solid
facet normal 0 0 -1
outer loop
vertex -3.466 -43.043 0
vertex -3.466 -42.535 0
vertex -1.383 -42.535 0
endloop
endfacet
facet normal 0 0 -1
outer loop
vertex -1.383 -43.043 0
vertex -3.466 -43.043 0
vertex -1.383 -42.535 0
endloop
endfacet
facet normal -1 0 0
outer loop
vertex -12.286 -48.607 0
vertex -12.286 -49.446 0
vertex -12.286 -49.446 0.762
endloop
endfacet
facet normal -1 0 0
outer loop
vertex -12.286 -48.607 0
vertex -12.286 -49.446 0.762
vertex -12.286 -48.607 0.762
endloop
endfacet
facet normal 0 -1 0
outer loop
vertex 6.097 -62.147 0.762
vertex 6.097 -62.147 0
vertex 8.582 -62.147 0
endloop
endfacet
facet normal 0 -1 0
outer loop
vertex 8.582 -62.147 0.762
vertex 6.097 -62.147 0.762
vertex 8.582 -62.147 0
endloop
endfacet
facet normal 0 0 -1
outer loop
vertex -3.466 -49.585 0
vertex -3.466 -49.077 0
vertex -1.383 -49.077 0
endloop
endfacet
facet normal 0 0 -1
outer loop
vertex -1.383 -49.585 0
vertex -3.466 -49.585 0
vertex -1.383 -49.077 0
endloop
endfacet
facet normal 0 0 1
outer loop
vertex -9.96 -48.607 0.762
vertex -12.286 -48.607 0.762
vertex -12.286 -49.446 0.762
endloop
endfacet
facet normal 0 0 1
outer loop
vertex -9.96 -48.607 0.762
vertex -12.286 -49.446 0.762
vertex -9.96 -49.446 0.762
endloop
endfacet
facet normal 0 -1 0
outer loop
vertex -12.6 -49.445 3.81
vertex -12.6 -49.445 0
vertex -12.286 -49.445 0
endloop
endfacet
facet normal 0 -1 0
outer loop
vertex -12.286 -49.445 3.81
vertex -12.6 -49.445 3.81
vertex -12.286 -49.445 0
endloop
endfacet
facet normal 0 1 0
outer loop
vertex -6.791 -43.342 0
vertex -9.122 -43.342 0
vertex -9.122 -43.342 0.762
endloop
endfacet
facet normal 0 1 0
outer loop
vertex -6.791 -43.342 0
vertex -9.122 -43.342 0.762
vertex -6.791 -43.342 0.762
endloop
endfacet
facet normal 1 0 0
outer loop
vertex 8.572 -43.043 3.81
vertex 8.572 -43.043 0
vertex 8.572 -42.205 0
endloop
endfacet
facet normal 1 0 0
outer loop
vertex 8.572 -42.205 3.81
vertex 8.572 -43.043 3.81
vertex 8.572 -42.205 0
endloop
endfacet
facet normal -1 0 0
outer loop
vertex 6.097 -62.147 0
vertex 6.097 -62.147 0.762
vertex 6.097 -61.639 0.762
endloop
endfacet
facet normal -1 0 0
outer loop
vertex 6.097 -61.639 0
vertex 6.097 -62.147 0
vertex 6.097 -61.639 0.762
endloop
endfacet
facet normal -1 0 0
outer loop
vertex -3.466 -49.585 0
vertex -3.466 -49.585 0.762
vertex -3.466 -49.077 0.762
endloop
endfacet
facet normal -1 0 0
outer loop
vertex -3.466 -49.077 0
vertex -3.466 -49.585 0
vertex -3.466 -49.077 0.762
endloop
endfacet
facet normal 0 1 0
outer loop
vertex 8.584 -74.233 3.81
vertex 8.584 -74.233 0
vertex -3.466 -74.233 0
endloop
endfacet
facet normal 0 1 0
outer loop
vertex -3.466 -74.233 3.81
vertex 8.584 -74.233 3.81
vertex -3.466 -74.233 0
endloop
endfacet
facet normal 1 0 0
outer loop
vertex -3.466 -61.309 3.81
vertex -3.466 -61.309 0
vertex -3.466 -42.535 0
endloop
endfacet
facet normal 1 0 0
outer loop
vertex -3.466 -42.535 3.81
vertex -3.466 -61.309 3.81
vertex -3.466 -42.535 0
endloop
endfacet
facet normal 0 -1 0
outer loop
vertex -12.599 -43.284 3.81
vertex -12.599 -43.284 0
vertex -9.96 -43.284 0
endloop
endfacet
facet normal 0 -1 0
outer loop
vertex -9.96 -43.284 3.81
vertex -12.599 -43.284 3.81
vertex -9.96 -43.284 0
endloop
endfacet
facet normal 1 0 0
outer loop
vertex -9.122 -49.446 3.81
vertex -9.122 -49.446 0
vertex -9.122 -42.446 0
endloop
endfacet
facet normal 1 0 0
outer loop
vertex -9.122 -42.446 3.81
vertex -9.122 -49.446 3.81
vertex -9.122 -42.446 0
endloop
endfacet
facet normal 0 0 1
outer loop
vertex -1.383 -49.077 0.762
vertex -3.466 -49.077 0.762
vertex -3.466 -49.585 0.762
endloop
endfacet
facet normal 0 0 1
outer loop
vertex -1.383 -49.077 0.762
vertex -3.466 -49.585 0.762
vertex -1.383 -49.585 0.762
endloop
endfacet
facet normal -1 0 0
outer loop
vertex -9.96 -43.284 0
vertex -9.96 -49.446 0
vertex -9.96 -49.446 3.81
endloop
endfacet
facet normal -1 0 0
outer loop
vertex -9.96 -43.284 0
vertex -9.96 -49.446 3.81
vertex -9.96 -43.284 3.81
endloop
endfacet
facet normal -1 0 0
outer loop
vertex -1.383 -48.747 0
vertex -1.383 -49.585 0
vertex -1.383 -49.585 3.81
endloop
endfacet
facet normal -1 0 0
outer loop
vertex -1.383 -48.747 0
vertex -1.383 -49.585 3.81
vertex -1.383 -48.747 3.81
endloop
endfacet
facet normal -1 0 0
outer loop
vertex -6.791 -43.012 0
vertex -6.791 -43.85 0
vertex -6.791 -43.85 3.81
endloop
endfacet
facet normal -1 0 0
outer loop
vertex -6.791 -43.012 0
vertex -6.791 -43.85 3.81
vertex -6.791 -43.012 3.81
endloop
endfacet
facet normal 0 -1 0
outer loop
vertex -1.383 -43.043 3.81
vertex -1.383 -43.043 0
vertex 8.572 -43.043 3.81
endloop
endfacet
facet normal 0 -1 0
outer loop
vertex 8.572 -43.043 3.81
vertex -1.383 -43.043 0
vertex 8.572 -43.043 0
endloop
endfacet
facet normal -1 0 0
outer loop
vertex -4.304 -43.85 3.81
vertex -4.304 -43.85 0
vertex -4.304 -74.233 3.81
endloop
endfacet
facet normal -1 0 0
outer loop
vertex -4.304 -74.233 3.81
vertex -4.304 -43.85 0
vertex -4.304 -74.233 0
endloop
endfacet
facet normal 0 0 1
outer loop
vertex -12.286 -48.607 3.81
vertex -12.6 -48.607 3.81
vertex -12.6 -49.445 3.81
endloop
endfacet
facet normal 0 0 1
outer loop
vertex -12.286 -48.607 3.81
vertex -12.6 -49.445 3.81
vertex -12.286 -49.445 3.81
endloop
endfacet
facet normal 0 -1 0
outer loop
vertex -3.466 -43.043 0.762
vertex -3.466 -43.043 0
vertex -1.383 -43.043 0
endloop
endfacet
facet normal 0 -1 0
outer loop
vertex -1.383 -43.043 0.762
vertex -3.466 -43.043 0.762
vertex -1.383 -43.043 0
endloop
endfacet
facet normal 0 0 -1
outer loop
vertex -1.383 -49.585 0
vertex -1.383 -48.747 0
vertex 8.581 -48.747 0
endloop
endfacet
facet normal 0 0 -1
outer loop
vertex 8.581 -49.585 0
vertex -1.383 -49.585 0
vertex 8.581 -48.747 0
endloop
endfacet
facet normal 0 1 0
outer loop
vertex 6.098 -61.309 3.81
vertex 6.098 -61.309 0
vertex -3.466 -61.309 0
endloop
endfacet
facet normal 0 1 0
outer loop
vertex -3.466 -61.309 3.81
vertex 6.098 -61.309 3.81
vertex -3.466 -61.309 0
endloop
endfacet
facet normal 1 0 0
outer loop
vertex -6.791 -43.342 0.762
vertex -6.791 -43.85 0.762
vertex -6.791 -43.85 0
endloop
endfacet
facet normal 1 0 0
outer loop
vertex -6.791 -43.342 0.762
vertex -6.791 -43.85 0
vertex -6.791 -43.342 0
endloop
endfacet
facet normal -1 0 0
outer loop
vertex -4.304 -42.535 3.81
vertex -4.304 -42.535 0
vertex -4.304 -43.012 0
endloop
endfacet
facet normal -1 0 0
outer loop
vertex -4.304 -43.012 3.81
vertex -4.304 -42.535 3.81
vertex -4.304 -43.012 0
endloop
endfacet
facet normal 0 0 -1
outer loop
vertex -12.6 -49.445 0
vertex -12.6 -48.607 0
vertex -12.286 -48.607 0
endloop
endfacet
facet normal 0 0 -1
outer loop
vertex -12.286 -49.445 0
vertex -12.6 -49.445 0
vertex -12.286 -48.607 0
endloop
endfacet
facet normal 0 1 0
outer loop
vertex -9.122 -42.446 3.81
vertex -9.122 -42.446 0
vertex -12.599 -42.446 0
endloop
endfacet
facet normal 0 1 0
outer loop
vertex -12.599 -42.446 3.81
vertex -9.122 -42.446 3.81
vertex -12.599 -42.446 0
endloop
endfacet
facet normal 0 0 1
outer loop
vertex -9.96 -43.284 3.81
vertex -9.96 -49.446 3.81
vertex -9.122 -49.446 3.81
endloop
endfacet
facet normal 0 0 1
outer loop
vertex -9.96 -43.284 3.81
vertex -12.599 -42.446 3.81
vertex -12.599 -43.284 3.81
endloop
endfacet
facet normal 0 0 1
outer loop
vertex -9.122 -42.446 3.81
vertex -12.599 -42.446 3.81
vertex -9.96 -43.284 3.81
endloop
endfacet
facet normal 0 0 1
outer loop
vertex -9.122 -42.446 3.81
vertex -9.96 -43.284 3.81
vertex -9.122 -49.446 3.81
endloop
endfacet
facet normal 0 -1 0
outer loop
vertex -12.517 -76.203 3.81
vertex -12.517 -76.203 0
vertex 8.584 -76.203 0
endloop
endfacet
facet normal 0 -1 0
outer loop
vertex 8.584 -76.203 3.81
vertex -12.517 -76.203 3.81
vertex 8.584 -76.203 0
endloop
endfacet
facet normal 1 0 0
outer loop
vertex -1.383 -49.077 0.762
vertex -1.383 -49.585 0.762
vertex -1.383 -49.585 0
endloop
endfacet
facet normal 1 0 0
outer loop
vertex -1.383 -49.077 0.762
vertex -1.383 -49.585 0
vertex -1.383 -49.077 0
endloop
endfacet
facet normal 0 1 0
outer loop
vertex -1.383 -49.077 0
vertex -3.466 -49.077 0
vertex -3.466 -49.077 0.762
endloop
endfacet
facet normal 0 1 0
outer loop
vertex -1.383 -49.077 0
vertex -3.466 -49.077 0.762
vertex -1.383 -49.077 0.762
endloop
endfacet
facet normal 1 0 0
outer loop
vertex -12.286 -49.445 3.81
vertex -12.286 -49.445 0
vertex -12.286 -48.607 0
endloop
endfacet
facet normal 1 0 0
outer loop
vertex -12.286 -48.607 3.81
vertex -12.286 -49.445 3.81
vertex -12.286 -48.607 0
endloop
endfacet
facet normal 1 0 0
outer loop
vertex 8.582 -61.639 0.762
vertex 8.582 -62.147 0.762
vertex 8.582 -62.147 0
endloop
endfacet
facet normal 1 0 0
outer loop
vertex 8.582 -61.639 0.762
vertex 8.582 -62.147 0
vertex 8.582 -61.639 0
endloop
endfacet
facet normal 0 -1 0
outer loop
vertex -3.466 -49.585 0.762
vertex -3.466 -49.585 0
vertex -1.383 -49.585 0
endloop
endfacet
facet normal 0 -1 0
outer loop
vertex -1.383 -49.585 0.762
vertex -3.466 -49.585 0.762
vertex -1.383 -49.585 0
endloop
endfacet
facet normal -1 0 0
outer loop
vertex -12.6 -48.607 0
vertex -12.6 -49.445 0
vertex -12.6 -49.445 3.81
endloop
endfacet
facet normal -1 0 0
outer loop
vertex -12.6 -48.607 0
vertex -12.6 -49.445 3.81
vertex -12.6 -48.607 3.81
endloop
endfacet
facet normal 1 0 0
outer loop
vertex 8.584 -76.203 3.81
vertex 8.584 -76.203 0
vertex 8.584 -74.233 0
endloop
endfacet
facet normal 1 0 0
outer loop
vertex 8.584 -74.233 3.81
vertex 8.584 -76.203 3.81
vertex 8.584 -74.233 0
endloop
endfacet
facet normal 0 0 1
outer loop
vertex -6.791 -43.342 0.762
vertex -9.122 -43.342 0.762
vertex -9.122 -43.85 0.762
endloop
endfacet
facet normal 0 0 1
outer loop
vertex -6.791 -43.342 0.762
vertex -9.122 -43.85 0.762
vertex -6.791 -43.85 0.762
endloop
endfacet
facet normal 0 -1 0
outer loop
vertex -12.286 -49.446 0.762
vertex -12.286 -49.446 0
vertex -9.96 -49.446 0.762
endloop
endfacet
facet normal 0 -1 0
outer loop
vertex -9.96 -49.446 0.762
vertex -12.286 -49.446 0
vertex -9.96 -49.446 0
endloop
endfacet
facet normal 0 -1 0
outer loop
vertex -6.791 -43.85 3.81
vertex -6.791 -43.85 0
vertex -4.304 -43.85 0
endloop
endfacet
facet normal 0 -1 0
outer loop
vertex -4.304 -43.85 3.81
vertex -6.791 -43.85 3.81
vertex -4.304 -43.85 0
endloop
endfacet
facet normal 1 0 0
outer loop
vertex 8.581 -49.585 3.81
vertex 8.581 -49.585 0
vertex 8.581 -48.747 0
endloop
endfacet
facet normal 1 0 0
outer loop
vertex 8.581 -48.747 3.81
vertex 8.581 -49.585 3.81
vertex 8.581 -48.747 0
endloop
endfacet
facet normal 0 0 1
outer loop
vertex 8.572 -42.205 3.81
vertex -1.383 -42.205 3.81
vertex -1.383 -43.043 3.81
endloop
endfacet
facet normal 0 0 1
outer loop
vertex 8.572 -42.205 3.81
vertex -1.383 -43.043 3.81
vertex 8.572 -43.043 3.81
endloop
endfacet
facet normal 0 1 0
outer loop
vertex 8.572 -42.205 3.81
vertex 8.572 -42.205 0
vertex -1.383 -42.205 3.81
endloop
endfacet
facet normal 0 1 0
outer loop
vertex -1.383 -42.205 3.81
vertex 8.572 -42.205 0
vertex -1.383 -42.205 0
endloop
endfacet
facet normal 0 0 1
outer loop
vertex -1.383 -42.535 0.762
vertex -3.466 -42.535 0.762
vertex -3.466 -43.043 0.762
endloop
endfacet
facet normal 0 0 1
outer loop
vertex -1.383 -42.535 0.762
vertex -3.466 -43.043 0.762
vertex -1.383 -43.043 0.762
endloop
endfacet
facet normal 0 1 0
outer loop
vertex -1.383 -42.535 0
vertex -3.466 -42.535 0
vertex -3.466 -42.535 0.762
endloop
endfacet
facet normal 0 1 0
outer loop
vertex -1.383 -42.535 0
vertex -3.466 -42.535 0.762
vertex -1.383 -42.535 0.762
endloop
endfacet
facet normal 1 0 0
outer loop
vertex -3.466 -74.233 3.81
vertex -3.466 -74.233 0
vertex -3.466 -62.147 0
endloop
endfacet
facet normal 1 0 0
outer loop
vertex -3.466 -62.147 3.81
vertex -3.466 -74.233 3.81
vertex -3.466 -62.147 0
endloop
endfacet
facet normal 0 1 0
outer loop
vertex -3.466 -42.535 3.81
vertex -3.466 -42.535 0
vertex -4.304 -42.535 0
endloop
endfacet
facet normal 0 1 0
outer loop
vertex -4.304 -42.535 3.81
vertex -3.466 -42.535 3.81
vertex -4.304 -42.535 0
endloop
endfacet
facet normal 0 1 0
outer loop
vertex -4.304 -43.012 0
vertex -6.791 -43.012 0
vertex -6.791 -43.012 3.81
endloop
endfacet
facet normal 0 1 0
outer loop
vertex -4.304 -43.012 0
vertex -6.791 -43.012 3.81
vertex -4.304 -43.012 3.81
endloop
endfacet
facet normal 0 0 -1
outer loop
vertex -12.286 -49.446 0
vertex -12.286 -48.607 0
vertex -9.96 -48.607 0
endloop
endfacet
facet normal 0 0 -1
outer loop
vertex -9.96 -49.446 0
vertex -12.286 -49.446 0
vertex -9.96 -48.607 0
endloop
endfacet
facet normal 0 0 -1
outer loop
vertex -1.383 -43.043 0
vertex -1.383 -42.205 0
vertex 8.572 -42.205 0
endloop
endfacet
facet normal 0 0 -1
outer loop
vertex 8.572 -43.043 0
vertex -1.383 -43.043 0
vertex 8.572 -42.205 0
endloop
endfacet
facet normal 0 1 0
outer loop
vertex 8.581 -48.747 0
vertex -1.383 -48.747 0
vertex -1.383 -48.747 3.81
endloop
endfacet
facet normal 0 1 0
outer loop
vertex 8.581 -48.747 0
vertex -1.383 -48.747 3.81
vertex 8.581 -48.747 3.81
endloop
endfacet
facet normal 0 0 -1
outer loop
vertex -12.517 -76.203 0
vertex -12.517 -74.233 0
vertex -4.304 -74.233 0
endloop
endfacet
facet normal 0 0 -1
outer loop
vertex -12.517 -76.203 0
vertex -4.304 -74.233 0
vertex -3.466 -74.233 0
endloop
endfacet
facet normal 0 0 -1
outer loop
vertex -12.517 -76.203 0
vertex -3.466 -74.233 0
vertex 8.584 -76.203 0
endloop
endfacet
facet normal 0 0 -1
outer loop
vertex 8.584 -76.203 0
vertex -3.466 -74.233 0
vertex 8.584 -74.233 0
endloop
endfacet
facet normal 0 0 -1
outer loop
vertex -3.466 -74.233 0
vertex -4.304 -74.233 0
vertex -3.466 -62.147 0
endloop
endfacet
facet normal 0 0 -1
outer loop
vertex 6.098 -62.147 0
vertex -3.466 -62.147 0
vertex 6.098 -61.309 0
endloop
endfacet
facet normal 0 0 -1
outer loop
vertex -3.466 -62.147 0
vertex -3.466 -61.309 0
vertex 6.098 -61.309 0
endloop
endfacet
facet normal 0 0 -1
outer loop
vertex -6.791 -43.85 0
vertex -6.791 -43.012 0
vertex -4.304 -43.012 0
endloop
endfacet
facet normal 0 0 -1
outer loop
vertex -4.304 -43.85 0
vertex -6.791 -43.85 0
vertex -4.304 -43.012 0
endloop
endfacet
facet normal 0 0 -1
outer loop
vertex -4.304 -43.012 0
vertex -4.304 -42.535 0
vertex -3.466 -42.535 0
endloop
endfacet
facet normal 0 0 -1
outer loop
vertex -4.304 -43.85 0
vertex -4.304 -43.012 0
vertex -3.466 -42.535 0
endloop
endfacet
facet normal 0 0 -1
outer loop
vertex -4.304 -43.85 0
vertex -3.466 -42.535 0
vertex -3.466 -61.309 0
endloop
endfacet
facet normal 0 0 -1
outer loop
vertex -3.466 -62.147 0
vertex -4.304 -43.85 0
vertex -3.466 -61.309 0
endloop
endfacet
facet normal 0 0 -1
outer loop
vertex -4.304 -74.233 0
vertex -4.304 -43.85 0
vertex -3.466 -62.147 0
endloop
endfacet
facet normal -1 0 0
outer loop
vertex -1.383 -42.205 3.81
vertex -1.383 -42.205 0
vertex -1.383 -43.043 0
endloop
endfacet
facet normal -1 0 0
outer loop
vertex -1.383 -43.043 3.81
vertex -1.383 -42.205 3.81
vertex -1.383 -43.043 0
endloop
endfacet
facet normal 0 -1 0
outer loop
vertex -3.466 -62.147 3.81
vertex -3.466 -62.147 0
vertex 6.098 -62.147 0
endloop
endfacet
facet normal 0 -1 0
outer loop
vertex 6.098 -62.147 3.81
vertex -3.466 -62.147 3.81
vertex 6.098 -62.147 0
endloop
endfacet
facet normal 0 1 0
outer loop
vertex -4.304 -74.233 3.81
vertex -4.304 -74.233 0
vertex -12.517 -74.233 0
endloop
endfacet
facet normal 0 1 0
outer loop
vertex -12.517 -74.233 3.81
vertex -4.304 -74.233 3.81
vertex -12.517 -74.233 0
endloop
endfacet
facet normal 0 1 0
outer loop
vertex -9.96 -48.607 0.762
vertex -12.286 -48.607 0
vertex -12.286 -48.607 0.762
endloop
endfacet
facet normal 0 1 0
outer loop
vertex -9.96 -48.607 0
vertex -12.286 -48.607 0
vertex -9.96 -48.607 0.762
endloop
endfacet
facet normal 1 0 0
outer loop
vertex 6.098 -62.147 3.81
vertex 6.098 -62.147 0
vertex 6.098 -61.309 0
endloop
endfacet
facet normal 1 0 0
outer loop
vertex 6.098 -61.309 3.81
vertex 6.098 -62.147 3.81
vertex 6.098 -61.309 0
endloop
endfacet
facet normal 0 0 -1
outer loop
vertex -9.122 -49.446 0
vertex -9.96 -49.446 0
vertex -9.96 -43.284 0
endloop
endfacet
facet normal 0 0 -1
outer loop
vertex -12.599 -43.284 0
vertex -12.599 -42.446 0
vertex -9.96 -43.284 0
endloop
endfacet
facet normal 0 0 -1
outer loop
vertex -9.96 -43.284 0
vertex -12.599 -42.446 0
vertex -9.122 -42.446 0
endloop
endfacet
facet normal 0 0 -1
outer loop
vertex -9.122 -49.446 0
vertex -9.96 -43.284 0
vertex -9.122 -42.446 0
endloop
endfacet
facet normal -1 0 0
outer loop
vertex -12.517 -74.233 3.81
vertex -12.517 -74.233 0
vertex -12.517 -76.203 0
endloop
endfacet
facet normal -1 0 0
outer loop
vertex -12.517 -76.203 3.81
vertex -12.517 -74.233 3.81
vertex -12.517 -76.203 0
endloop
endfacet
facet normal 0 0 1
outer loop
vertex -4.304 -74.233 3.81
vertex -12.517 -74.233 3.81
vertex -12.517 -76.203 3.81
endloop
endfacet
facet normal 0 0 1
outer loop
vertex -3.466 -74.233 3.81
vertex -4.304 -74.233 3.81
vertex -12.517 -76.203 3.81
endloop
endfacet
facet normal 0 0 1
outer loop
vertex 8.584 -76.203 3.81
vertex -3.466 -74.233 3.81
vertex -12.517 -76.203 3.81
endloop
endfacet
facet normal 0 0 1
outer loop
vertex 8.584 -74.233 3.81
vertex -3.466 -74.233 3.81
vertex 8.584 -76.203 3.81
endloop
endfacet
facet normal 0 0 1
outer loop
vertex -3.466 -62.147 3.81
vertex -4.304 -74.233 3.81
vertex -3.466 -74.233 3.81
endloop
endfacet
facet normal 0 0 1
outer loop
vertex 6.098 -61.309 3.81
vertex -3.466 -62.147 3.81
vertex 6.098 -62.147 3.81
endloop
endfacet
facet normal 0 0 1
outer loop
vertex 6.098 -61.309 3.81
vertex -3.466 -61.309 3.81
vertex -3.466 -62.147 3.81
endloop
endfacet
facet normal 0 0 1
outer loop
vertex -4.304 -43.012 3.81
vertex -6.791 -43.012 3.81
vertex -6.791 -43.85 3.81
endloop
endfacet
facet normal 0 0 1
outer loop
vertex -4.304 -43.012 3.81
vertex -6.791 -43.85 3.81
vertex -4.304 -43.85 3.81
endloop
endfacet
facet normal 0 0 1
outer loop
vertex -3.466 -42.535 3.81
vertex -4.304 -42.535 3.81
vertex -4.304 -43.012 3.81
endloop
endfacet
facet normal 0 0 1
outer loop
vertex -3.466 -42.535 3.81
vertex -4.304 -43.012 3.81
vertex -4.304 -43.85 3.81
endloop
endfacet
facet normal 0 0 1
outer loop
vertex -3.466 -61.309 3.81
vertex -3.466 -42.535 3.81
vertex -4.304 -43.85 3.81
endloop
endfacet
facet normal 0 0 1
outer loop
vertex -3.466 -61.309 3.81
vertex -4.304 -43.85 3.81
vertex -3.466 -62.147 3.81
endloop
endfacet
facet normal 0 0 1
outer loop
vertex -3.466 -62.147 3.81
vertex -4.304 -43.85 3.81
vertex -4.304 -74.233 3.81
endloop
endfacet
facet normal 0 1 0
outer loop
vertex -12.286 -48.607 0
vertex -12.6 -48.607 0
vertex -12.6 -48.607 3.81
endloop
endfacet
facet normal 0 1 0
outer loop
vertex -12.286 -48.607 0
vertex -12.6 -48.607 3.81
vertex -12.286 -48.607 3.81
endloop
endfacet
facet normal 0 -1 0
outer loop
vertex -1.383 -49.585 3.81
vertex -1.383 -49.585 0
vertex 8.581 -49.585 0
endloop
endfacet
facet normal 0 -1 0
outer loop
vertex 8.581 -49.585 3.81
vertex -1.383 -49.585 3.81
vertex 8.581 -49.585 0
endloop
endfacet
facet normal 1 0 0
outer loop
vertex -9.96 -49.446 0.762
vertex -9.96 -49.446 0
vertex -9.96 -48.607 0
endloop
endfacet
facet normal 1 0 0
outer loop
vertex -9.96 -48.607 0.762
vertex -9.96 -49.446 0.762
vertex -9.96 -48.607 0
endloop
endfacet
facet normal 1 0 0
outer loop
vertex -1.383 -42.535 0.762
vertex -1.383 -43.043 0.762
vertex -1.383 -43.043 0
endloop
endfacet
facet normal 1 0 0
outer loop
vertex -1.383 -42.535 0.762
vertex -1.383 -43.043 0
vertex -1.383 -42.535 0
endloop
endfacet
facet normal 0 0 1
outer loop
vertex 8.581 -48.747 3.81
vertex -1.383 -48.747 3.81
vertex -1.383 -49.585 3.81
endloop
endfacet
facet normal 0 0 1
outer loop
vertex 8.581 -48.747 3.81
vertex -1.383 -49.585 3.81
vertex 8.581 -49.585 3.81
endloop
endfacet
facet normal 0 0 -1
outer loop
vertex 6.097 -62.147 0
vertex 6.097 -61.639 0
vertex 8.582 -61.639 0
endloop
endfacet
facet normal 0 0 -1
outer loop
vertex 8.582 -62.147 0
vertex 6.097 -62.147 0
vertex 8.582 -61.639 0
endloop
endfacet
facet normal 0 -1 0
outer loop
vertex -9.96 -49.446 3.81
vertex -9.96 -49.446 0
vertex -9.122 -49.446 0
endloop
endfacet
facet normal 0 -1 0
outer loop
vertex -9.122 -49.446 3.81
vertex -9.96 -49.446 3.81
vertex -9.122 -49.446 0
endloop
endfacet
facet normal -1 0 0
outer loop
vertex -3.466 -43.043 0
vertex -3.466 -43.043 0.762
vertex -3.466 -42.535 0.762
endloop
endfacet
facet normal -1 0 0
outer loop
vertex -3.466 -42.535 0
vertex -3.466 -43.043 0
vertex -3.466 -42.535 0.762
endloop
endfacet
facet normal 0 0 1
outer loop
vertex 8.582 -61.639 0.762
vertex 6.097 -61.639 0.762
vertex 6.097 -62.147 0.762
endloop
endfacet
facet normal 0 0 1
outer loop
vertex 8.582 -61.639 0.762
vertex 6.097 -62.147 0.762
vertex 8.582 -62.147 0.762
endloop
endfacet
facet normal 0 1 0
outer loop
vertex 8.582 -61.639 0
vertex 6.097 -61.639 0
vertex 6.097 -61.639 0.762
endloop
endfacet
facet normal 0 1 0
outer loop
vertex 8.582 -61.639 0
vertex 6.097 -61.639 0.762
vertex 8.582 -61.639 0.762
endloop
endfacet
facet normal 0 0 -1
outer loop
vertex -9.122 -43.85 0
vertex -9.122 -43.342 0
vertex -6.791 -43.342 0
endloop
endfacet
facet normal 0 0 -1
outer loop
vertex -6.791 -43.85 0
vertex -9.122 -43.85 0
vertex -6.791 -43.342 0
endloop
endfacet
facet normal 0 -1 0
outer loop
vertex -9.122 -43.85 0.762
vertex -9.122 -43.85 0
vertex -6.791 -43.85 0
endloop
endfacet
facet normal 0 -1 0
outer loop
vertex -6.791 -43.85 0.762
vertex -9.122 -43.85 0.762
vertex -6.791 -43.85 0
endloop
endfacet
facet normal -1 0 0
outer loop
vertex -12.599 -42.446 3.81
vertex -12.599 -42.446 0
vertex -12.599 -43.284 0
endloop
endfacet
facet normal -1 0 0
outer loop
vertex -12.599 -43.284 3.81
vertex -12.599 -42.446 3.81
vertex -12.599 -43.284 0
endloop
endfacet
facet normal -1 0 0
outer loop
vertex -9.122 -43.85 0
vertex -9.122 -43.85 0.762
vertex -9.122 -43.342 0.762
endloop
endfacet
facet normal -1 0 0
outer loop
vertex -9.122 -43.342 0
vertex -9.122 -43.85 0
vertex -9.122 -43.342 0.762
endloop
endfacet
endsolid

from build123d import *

# Parameters (mm, degrees)
F0_W     = 9.5635297272
F0_H     = 0.8382
F0_W_2   = 0.013438423
F0_W_3   = 0.8382
F0_H_2   = 1.9130930305
F0_W_4   = 2.4869742338
F1_DEPTH = 3.81
F0_W_5   = 9.9639619002
F0_W_6   = 0.3146585077
F0_H_3   = 6.1624832451
F2_W     = 2.3257764
F2_H     = 0.8382
F3_DEPTH = 0.762
F2_W_2   = 2.3305516
F2_H_2   = 0.508
F2_W_3   = 2.0828
F2_W_4   = 2.4851868


with BuildPart() as f1:
    # F0 (on Top) → F1 (new body)
    with BuildSketch(Plane.XY):
        with Locations((1.315930461, -61.7276642486)):
            Rectangle(F0_W, F0_H)
        with Locations((-3.4725536141, -61.7276642486)):
            Rectangle(F0_W_2, F0_H)
        Polygon((-3.4792728256, -61.3085642486), (-3.4658344026, -61.3085642486), (-3.4658344026, -42.5347350538), (-4.3040344026, -42.5347350538), (-4.3040344026, -43.0116258591), (-4.3040344026, -43.8498258591), (-4.3040344026, -74.232660234), (-3.4658344026, -74.232660234), (-3.4658344026, -62.1467642486), (-3.4792728256, -62.1467642486), align=None)
        Polygon((8.5839493171, -74.232660234), (-3.4658344026, -74.232660234), (-3.4658344026, -76.1457532644), (-4.3040344026, -76.1457532644), (-4.3040344026, -74.232660234), (-12.5174090295, -74.232660234), (-12.5174090295, -76.2031450868), (8.5839493171, -76.2031450868), align=None)
        with Locations((-3.8849344026, -75.1892067492)):
            Rectangle(F0_W_3, F0_H_2)
        with Locations((-5.5475215195, -43.4307258591)):
            Rectangle(F0_W_4, F0_H)
    extrude(amount=F1_DEPTH)


with BuildPart() as f1b:
    # F0 (on Top) → F1, piece 2 (new body)
    with BuildSketch(Plane.XY):
        with Locations((3.5989465475, -49.1661120221)):
            Rectangle(F0_W_5, F0_H)
    extrude(amount=F1_DEPTH)


with BuildPart() as f1c:
    # F0 (on Top) → F1, piece 3 (new body)
    with BuildSketch(Plane.XY):
        Polygon((8.5711954095, -42.2047168046), (-1.3830344026, -42.2047168046), (-1.3830344026, -43.0429168046), (8.5723763266, -43.0429168046), (8.5723763266, -42.2047168046), align=None)
    extrude(amount=F1_DEPTH)


with BuildPart() as f1d:
    # F0 (on Top) → F1, piece 4 (new body)
    with BuildSketch(Plane.XY):
        with Locations((-12.4428793788, -49.0263912841)):
            Rectangle(F0_W_6, F0_H)
    extrude(amount=F1_DEPTH)


with BuildPart() as f1e:
    # F0 (on Top) → F1, piece 5 (new body)
    with BuildSketch(Plane.XY):
        with Locations((-9.5406619846, -46.3651325554)):
            Rectangle(F0_W_3, F0_H_3)
        Polygon((-9.9597619846, -43.2838909328), (-9.1215619846, -43.2838909328), (-9.1215619846, -42.4456909328), (-12.5985499471, -42.4456909328), (-12.5985499471, -43.2838909328), align=None)
    extrude(amount=F1_DEPTH)


with BuildPart() as f3:
    # F2 (on Top) → F3 (new body)
    with BuildSketch(Plane.XY):
        with Locations((-11.1226551235, -49.0264538689)):
            Rectangle(F2_W, F2_H)
    extrude(amount=F3_DEPTH)


with BuildPart() as f3b:
    # F2 (on Top) → F3, piece 2 (new body)
    with BuildSketch(Plane.XY):
        with Locations((-7.9562930735, -43.5959078155)):
            Rectangle(F2_W_2, F2_H_2)
    extrude(amount=F3_DEPTH)


with BuildPart() as f3c:
    # F2 (on Top) → F3, piece 3 (new body)
    with BuildSketch(Plane.XY):
        with Locations((-2.4244838995, -42.7889168046)):
            Rectangle(F2_W_3, F2_H_2)
    extrude(amount=F3_DEPTH)


with BuildPart() as f3d:
    # F2 (on Top) → F3, piece 4 (new body)
    with BuildSketch(Plane.XY):
        with Locations((-2.424481804, -49.3311002634)):
            Rectangle(F2_W_3, F2_H_2)
    extrude(amount=F3_DEPTH)


with BuildPart() as f3e:
    # F2 (on Top) → F3, piece 5 (new body)
    with BuildSketch(Plane.XY):
        with Locations((7.3394230602, -61.893051096)):
            Rectangle(F2_W_4, F2_H_2)
    extrude(amount=F3_DEPTH)


solid = Compound([f1.part, f1b.part, f1c.part, f1d.part, f1e.part, f3.part, f3b.part, f3c.part, f3d.part, f3e.part])
